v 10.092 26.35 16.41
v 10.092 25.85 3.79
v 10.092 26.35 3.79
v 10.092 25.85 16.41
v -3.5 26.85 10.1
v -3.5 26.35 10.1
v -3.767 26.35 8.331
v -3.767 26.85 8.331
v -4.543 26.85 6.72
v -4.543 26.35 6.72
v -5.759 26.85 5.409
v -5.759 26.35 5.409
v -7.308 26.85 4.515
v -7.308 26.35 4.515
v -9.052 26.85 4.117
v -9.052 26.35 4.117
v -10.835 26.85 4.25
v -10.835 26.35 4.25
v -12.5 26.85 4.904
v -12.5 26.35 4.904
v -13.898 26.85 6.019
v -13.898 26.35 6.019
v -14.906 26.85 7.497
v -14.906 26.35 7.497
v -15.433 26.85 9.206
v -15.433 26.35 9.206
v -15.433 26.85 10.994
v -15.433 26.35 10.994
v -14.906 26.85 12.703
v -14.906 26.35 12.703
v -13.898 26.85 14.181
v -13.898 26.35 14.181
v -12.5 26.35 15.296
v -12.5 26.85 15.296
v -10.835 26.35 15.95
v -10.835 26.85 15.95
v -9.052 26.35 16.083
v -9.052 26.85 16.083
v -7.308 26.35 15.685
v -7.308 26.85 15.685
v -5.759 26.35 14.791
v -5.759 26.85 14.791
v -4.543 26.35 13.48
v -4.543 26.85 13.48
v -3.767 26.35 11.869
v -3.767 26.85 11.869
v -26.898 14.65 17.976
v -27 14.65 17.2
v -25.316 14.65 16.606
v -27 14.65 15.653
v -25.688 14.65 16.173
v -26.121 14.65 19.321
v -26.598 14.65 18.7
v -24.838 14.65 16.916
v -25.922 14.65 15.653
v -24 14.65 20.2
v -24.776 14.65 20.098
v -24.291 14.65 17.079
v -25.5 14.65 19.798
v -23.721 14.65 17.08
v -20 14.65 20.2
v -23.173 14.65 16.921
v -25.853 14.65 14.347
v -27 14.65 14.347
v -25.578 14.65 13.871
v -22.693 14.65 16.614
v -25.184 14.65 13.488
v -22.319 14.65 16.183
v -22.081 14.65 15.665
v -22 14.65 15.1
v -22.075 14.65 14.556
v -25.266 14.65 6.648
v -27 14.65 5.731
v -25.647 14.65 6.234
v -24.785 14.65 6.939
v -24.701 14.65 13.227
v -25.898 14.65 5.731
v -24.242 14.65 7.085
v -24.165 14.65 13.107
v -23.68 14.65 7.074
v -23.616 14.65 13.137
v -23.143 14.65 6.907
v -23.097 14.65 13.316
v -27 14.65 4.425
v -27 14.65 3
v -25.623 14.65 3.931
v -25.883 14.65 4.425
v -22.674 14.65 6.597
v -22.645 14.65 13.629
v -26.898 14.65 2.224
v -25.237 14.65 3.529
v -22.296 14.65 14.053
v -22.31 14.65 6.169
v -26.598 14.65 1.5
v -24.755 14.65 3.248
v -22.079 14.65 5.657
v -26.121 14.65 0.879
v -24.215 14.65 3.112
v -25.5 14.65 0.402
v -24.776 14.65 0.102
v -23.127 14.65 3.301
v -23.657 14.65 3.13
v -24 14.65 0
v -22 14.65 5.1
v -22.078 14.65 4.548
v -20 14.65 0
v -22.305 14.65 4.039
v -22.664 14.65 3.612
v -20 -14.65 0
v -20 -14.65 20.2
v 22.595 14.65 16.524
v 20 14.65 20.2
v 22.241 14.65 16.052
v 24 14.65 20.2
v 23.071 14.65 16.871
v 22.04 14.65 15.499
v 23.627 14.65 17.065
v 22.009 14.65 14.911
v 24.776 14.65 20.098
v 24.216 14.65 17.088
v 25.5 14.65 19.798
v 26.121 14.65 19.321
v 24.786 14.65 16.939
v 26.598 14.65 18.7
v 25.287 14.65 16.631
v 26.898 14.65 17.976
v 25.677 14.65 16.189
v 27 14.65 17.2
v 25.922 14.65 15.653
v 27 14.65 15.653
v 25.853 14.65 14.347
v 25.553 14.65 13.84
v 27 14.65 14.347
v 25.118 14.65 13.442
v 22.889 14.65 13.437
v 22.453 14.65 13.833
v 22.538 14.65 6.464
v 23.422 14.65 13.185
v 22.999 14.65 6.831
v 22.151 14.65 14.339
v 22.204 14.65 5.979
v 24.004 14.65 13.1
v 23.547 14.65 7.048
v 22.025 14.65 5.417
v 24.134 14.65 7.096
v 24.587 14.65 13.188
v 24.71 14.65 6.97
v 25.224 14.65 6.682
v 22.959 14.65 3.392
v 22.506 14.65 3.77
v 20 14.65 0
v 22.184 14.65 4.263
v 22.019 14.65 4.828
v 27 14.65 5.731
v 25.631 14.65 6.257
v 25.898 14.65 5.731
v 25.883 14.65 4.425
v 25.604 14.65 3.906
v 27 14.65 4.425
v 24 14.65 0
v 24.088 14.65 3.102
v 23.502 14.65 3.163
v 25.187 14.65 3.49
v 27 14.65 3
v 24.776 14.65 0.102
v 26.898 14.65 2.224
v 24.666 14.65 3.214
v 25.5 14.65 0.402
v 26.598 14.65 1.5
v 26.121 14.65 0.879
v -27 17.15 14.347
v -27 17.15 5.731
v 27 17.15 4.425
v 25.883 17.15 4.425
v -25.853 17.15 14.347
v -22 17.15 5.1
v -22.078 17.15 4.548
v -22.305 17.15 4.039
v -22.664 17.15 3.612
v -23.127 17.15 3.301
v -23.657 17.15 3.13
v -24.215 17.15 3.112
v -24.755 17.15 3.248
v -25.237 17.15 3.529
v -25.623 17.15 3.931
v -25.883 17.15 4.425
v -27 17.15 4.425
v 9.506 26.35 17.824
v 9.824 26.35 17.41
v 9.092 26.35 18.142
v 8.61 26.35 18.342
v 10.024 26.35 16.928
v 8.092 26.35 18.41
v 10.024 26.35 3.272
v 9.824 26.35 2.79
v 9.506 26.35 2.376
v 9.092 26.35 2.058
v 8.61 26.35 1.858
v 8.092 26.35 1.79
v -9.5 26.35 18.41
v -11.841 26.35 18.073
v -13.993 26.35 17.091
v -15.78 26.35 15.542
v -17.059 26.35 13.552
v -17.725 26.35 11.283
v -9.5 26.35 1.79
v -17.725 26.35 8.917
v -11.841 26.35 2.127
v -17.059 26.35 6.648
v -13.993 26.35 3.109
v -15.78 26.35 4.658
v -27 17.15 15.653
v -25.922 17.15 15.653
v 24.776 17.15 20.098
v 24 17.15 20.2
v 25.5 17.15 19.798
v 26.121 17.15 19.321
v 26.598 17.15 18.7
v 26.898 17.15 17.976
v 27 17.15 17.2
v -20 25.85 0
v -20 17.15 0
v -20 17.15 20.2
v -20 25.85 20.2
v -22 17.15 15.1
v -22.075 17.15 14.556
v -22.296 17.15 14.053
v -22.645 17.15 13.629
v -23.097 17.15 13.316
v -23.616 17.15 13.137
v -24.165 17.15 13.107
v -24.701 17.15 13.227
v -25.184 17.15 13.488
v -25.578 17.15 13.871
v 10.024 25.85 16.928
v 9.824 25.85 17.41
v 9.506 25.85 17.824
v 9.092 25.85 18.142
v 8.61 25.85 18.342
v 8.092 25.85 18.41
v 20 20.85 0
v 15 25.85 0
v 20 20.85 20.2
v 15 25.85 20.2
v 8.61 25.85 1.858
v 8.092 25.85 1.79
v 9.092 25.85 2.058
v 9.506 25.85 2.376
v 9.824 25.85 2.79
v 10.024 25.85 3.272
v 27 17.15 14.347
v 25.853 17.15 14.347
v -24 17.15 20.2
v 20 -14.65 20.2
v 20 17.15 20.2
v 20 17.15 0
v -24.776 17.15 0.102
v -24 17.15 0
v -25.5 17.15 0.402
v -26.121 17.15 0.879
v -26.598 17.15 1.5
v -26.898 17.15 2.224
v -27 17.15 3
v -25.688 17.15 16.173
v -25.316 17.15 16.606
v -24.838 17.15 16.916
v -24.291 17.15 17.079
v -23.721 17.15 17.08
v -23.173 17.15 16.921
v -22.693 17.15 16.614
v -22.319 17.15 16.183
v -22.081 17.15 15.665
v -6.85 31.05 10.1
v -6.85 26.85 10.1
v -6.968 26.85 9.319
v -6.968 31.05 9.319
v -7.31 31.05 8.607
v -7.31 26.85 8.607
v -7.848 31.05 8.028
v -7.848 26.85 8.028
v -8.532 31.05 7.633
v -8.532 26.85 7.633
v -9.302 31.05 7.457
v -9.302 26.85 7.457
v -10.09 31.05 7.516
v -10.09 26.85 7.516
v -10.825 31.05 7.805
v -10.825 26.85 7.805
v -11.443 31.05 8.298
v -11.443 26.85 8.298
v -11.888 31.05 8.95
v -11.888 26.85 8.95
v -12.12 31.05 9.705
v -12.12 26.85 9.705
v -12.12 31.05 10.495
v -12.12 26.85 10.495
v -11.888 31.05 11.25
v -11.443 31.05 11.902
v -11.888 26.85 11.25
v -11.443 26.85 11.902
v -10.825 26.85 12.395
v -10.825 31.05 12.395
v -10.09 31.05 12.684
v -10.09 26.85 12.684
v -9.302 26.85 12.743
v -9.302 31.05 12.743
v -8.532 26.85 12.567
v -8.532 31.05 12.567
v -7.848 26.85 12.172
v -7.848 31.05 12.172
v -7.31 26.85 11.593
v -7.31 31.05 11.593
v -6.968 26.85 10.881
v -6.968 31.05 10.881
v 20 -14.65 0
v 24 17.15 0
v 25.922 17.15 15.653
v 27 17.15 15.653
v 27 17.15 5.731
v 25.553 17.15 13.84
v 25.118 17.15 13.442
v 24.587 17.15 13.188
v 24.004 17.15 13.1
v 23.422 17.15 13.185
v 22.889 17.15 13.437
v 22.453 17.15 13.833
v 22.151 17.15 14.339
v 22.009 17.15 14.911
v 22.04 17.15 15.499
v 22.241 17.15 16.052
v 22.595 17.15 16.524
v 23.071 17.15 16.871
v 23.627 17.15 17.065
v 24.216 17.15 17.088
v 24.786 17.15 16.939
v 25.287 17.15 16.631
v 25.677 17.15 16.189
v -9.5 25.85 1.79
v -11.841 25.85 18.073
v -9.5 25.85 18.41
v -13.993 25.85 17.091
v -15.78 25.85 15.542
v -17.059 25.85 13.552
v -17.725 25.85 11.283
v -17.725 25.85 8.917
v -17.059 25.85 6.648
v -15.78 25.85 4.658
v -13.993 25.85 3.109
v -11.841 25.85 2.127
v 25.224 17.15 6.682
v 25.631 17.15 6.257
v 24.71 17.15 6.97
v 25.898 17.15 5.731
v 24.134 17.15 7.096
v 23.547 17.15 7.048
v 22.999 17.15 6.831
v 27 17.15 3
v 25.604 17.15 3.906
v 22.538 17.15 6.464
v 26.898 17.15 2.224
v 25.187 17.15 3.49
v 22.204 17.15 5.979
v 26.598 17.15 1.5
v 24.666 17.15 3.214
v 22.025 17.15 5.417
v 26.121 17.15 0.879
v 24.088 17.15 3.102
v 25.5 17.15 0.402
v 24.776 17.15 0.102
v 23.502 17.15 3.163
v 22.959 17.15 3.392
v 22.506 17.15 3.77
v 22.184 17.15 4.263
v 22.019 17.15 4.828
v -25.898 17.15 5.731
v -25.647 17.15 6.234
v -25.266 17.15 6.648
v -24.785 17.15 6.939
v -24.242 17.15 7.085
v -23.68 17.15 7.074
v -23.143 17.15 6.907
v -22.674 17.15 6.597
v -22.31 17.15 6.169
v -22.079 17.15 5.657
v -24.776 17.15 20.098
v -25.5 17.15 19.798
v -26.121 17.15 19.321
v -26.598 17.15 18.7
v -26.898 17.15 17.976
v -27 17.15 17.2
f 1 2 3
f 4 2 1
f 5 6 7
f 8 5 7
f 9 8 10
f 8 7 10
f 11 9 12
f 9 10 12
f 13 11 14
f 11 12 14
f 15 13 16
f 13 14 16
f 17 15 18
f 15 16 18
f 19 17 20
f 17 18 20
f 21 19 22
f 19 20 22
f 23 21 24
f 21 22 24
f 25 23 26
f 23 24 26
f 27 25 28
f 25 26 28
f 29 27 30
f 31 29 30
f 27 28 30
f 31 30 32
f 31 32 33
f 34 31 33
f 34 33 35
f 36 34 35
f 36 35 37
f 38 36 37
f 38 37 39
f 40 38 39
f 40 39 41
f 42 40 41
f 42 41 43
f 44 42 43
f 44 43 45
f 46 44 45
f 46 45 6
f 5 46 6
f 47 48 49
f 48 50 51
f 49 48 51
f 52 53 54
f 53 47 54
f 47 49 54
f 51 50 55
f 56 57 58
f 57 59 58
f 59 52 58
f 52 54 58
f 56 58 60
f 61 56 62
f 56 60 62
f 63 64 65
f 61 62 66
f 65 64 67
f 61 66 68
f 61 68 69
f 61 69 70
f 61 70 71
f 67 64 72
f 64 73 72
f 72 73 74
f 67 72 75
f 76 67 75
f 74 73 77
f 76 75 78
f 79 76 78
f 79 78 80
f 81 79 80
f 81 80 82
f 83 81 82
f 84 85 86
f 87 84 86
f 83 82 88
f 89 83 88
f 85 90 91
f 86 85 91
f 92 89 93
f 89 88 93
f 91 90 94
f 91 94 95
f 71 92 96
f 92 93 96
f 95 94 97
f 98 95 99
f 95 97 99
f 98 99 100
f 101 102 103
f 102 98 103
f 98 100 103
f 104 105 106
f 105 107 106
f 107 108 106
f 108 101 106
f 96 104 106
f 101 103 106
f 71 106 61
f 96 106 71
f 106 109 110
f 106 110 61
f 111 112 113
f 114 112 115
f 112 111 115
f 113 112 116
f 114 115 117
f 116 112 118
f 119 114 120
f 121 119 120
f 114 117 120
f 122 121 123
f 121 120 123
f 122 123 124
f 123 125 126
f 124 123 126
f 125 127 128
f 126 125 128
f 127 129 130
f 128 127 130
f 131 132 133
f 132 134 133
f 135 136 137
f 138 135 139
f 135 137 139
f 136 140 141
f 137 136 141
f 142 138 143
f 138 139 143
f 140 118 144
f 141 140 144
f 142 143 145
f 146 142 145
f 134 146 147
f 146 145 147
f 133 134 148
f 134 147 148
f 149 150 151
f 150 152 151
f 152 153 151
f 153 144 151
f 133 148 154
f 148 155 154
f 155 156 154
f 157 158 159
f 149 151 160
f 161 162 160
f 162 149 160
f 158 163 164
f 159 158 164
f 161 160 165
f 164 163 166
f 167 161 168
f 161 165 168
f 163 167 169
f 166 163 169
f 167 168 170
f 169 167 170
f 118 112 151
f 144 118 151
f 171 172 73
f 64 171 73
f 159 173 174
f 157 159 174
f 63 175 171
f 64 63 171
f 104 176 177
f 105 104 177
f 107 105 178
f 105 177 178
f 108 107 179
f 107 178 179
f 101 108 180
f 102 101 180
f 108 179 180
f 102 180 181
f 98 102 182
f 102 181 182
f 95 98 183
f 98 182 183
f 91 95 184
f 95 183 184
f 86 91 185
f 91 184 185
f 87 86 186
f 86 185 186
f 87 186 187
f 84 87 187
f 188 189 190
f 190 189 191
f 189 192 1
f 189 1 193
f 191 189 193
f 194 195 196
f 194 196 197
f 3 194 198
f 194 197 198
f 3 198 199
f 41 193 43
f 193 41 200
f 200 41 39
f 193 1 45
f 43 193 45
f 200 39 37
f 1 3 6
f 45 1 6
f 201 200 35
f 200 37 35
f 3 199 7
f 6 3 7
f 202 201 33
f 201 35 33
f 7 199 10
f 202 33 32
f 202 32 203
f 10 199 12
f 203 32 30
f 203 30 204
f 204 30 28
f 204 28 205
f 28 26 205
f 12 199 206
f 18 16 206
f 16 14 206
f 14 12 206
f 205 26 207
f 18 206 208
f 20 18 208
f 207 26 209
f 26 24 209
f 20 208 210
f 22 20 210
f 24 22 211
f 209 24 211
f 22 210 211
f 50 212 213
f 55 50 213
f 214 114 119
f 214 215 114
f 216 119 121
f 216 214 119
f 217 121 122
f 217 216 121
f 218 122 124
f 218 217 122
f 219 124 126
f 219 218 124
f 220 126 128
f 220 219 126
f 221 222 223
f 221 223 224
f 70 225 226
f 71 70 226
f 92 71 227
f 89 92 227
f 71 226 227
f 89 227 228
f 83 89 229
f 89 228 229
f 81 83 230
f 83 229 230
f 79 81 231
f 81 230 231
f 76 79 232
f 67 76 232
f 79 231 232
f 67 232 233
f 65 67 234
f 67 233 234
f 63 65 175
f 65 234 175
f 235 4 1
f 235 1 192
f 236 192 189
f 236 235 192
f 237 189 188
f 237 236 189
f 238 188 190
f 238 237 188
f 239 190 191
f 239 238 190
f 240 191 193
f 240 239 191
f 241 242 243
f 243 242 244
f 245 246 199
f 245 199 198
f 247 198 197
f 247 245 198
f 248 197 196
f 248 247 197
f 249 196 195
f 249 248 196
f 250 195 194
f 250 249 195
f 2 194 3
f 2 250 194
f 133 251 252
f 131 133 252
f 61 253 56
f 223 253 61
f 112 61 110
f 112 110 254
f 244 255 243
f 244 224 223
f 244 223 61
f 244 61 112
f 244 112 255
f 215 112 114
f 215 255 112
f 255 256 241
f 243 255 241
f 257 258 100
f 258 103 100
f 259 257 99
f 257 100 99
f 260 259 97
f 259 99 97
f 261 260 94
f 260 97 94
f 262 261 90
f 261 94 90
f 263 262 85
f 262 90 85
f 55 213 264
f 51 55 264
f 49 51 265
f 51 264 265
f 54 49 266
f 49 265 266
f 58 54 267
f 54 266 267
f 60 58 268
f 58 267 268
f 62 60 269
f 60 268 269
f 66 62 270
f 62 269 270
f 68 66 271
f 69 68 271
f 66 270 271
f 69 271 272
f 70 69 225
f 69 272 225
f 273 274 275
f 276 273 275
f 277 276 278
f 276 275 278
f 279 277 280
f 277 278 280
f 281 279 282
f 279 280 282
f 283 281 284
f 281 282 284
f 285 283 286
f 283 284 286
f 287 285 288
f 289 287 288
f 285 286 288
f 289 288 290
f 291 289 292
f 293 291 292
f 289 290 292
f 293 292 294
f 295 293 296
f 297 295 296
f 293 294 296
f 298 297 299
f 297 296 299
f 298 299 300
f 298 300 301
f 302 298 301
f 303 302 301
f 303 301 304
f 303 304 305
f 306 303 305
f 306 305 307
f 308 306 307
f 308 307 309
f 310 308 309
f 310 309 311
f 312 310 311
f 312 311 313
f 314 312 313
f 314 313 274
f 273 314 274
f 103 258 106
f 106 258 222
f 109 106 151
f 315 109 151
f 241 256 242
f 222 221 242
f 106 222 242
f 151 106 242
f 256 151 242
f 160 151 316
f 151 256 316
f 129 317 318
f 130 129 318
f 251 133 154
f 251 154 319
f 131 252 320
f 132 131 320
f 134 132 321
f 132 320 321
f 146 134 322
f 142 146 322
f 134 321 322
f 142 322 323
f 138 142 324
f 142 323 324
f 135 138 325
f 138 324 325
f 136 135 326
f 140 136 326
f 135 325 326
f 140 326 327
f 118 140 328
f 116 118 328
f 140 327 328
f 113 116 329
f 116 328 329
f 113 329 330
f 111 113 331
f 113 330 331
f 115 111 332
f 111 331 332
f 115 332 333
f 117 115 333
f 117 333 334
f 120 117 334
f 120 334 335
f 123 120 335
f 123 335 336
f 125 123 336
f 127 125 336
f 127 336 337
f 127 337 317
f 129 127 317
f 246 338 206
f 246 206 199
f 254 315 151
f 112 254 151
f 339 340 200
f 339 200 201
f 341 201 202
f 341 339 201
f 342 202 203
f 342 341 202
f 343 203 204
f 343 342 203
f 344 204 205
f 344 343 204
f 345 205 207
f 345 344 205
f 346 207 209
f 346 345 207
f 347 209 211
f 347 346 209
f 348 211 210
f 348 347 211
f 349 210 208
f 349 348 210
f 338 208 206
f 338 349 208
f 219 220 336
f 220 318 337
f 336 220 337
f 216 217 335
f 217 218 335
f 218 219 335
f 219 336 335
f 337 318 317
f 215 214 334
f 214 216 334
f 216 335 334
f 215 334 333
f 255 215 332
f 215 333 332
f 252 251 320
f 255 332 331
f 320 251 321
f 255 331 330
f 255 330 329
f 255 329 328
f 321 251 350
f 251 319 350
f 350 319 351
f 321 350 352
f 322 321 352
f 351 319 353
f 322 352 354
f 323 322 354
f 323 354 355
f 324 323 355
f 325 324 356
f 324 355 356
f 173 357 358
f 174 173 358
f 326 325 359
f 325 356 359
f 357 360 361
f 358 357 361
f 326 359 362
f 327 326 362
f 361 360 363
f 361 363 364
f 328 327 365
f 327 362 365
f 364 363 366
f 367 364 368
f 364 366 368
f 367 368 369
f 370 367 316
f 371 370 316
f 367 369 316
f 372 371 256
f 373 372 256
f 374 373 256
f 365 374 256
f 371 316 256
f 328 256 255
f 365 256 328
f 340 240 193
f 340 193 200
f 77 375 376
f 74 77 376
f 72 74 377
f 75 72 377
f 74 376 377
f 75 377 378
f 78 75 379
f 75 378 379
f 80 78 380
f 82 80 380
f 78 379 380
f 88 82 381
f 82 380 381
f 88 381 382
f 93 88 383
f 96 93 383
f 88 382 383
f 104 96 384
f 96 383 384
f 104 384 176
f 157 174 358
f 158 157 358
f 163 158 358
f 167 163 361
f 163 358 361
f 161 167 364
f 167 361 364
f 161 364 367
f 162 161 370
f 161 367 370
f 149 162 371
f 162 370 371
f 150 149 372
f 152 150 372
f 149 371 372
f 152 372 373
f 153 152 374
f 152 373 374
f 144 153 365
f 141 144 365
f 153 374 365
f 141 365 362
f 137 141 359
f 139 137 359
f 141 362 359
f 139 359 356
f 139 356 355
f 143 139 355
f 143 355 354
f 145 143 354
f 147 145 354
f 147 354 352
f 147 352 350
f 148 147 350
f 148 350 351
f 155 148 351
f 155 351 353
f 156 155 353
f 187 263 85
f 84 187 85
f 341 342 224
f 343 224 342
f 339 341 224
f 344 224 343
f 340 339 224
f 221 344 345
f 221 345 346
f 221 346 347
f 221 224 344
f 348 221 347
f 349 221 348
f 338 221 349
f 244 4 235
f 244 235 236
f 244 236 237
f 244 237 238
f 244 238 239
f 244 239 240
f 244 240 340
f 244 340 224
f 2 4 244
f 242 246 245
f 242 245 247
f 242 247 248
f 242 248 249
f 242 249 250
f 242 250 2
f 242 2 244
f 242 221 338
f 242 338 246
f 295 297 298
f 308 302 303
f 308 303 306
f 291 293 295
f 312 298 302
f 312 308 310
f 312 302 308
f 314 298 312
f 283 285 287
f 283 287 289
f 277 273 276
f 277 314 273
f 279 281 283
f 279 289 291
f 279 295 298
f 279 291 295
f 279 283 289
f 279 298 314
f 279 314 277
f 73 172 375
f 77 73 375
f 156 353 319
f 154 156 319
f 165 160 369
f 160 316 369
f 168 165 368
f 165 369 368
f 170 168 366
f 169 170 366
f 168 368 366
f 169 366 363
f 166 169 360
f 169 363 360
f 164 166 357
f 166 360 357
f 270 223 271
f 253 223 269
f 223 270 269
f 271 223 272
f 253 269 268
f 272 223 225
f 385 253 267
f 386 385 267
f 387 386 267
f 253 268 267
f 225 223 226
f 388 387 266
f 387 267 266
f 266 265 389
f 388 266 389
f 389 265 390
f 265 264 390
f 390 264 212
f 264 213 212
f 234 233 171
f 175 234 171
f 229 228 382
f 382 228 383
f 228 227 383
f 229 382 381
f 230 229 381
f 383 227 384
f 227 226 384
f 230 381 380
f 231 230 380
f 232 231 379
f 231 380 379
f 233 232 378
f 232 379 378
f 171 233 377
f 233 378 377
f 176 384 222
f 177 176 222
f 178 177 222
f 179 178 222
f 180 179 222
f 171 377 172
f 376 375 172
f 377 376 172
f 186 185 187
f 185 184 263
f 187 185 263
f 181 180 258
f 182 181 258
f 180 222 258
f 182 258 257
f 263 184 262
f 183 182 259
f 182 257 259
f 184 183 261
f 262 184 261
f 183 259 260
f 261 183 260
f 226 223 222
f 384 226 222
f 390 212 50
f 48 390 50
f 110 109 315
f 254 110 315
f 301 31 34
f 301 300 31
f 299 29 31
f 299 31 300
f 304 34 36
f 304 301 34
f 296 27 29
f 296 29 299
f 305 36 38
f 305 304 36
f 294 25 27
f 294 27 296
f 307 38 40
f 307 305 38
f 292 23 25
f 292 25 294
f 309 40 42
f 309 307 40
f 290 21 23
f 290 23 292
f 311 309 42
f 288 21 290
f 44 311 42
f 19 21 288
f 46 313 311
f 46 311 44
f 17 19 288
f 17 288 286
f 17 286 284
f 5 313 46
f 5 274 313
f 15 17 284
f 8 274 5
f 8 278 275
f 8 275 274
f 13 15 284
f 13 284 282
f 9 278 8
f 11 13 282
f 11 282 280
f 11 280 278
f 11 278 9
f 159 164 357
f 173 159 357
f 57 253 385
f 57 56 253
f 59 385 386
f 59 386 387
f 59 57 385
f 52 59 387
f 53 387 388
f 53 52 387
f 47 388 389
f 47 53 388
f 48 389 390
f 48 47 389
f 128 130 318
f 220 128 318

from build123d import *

# Parameters (mm, degrees)
SKETCH1_W           = 40
SKETCH1_H           = 29.3
SKETCH1_H_2         = 8.7
BOSS_EXTRUDE1_DEPTH = 20.2
SKETCH2_R           = 2.65
BOSS_EXTRUDE2_DEPTH = 5.2
SKETCH3_W           = 0.446843519
SKETCH3_H           = 1.306192745
SKETCH3_H_2         = 1.306192746
CUT_EXTRUDE1_DEPTH  = 5.2
FILLET1_R           = 3
CHAMFER1_SIZE       = 5
SKETCH4_R           = 6
BOSS_EXTRUDE3_DEPTH = 1
BOSS_EXTRUDE4_DEPTH = 0.5


with BuildPart() as part:
    # Sketch1 → Boss-Extrude1 (new body)
    with BuildSketch(Plane.XY):
        Rectangle(SKETCH1_W, SKETCH1_H)
        Polygon((-27, 14.65), (-20, 14.65), (20, 14.65), (27, 14.65), (27, 17.15), (20, 17.15), (-20, 17.15), (-27, 17.15), align=None)
        with Locations((0, 21.5)):
            Rectangle(SKETCH1_W, SKETCH1_H_2)
    extrude(amount=BOSS_EXTRUDE1_DEPTH)

    # Sketch2 → Boss-Extrude2 (add)
    with BuildSketch(Plane(origin=(0, 25.85, 0), x_dir=(1, 0, 0), z_dir=(0, 1, 0))):
        with Locations((-9.5, -10.1)):
            Circle(SKETCH2_R)
    extrude(amount=BOSS_EXTRUDE2_DEPTH)

    # Sketch3 → Cut-Extrude1 (cut)
    with BuildSketch(Plane(origin=(0, 17.15, 0), x_dir=(1, 0, 0), z_dir=(0, 1, 0))):
        with BuildLine():
            Line((-25.540550997, -5.731244645), (-25.540550997, -4.4250519))
            Line((-25.540550997, -4.4250519), (-25.882669663, -4.4250519))
            ThreePointArc((-25.882669663, -4.4250519), (-25.99986637, -5.076880711), (-25.897769796, -5.731244645))
            Line((-25.897769796, -5.731244645), (-25.540550997, -5.731244645))
        make_face()
        with BuildLine():
            Line((-25.882669663, -4.4250519), (-25.540550997, -4.4250519))
            Line((-25.540550997, -4.4250519), (-25.540550997, -5.731244645))
            Line((-25.540550997, -5.731244645), (-25.897769796, -5.731244645))
            ThreePointArc((-25.897769796, -5.731244645), (-23.680265416, -7.074277031), (-22, -5.1))
            ThreePointArc((-22, -5.1), (-23.657464839, -3.129550898), (-25.882669663, -4.4250519))
        make_face()
        with BuildLine():
            ThreePointArc((-25.897769796, -5.731244645), (-25.99986637, -5.076880711), (-25.882669663, -4.4250519))
            Line((-25.882669663, -4.4250519), (-27.446843519, -4.4250519))
            Line((-27.446843519, -4.4250519), (-27.446843519, -5.731244645))
            Line((-27.446843519, -5.731244645), (-25.897769796, -5.731244645))
        make_face()
        with BuildLine():
            Line((-25.540550997, -15.653096373), (-25.540550997, -14.346903627))
            Line((-25.540550997, -14.346903627), (-25.852794067, -14.346903627))
            ThreePointArc((-25.852794067, -14.346903627), (-25.997198696, -14.994182379), (-25.922000105, -15.653096373))
            Line((-25.922000105, -15.653096373), (-25.540550997, -15.653096373))
        make_face()
        with BuildLine():
            Line((-25.852794067, -14.346903627), (-25.540550997, -14.346903627))
            Line((-25.540550997, -14.346903627), (-25.540550997, -15.653096373))
            Line((-25.540550997, -15.653096373), (-25.922000105, -15.653096373))
            ThreePointArc((-25.922000105, -15.653096373), (-23.720715387, -17.080404026), (-22, -15.1))
            ThreePointArc((-22, -15.1), (-23.616325746, -13.137146448), (-25.852794067, -14.346903627))
        make_face()
        with BuildLine():
            ThreePointArc((-25.922000105, -15.653096373), (-25.997198696, -14.994182379), (-25.852794067, -14.346903627))
            Line((-25.852794067, -14.346903627), (-27.446843519, -14.346903627))
            Line((-27.446843519, -14.346903627), (-27.446843519, -15.653096373))
            Line((-27.446843519, -15.653096373), (-25.922000105, -15.653096373))
        make_face()
        with Locations((27.223421759, -5.078148273)):
            Rectangle(SKETCH3_W, SKETCH3_H)
        with BuildLine():
            ThreePointArc((26, -5.1), (25.974277031, -5.419734584), (25.897769796, -5.731244645))
            Line((25.897769796, -5.731244645), (27, -5.731244645))
            Line((27, -5.731244645), (27, -4.4250519))
            Line((27, -4.4250519), (25.882669663, -4.4250519))
            ThreePointArc((25.882669663, -4.4250519), (25.970449102, -4.757464839), (26, -5.1))
        make_face()
        with BuildLine():
            Line((25.540550997, -4.4250519), (25.540550997, -5.731244645))
            Line((25.540550997, -5.731244645), (25.897769796, -5.731244645))
            ThreePointArc((25.897769796, -5.731244645), (25.974277031, -5.419734584), (26, -5.1))
            ThreePointArc((26, -5.1), (25.970449102, -4.757464839), (25.882669663, -4.4250519))
            Line((25.882669663, -4.4250519), (25.540550997, -4.4250519))
        make_face()
        with BuildLine():
            Line((25.897769796, -5.731244645), (25.540550997, -5.731244645))
            Line((25.540550997, -5.731244645), (25.540550997, -4.4250519))
            Line((25.540550997, -4.4250519), (25.882669663, -4.4250519))
            ThreePointArc((25.882669663, -4.4250519), (22.00013363, -5.123119289), (25.897769796, -5.731244645))
        make_face()
        with Locations((27.223421759, -15)):
            Rectangle(SKETCH3_W, SKETCH3_H_2)
        with BuildLine():
            Line((27, -15.653096373), (27, -14.346903627))
            Line((27, -14.346903627), (25.852794067, -14.346903627))
            ThreePointArc((25.852794067, -14.346903627), (25.962853552, -14.716325746), (26, -15.1))
            ThreePointArc((26, -15.1), (25.980404026, -15.379284613), (25.922000105, -15.653096373))
            Line((25.922000105, -15.653096373), (27, -15.653096373))
        make_face()
        with BuildLine():
            ThreePointArc((26, -15.1), (25.962853552, -14.716325746), (25.852794067, -14.346903627))
            Line((25.852794067, -14.346903627), (25.540550997, -14.346903627))
            Line((25.540550997, -14.346903627), (25.540550997, -15.653096373))
            Line((25.540550997, -15.653096373), (25.922000105, -15.653096373))
            ThreePointArc((25.922000105, -15.653096373), (25.980404026, -15.379284613), (26, -15.1))
        make_face()
        with BuildLine():
            Line((25.540550997, -14.346903627), (25.852794067, -14.346903627))
            ThreePointArc((25.852794067, -14.346903627), (22.002801304, -15.205817621), (25.922000105, -15.653096373))
            Line((25.922000105, -15.653096373), (25.540550997, -15.653096373))
            Line((25.540550997, -15.653096373), (25.540550997, -14.346903627))
        make_face()
    extrude(amount=-CUT_EXTRUDE1_DEPTH, mode=Mode.SUBTRACT)

    # Fillet1
    fillet1_edges = [part.edges().sort_by_distance(p)[0] for p in [
        (-27, 15.9, 0),
        (27, 15.9, 0),
        (27, 15.9, 20.2),
        (-27, 15.9, 20.2),
    ]]
    fillet(fillet1_edges, radius=FILLET1_R)

    # Chamfer1
    chamfer1_edges = [part.edges().sort_by_distance(p)[0] for p in [
        (20, 25.85, 10.1),
    ]]
    chamfer(chamfer1_edges, length=CHAMFER1_SIZE)

    # Sketch4 → Boss-Extrude3 (add)
    with BuildSketch(Plane(origin=(0, 25.85, 0), x_dir=(1, 0, 0), z_dir=(0, 1, 0))):
        with Locations((-9.5, -10.1)):
            Circle(SKETCH4_R)
    extrude(amount=BOSS_EXTRUDE3_DEPTH)

    # Sketch5 → Boss-Extrude4 (add)
    with BuildSketch(Plane(origin=(0, 25.85, 0), x_dir=(1, 0, 0), z_dir=(0, 1, 0))):
        with BuildLine():
            Line((-9.5, -1.789920634), (8.092095239, -1.789920634))
            ThreePointArc((8.092095239, -1.789920634), (9.506308801, -2.375707072), (10.092095239, -3.789920634))
            Line((10.092095239, -3.789920634), (10.092095239, -16.410079366))
            ThreePointArc((10.092095239, -16.410079366), (9.506308801, -17.824292928), (8.092095239, -18.410079366))
            Line((8.092095239, -18.410079366), (-9.5, -18.410079366))
            ThreePointArc((-9.5, -18.410079366), (-17.810079366, -10.1), (-9.5, -1.789920634))
        make_face()
    extrude(amount=BOSS_EXTRUDE4_DEPTH)


solid = part.part
